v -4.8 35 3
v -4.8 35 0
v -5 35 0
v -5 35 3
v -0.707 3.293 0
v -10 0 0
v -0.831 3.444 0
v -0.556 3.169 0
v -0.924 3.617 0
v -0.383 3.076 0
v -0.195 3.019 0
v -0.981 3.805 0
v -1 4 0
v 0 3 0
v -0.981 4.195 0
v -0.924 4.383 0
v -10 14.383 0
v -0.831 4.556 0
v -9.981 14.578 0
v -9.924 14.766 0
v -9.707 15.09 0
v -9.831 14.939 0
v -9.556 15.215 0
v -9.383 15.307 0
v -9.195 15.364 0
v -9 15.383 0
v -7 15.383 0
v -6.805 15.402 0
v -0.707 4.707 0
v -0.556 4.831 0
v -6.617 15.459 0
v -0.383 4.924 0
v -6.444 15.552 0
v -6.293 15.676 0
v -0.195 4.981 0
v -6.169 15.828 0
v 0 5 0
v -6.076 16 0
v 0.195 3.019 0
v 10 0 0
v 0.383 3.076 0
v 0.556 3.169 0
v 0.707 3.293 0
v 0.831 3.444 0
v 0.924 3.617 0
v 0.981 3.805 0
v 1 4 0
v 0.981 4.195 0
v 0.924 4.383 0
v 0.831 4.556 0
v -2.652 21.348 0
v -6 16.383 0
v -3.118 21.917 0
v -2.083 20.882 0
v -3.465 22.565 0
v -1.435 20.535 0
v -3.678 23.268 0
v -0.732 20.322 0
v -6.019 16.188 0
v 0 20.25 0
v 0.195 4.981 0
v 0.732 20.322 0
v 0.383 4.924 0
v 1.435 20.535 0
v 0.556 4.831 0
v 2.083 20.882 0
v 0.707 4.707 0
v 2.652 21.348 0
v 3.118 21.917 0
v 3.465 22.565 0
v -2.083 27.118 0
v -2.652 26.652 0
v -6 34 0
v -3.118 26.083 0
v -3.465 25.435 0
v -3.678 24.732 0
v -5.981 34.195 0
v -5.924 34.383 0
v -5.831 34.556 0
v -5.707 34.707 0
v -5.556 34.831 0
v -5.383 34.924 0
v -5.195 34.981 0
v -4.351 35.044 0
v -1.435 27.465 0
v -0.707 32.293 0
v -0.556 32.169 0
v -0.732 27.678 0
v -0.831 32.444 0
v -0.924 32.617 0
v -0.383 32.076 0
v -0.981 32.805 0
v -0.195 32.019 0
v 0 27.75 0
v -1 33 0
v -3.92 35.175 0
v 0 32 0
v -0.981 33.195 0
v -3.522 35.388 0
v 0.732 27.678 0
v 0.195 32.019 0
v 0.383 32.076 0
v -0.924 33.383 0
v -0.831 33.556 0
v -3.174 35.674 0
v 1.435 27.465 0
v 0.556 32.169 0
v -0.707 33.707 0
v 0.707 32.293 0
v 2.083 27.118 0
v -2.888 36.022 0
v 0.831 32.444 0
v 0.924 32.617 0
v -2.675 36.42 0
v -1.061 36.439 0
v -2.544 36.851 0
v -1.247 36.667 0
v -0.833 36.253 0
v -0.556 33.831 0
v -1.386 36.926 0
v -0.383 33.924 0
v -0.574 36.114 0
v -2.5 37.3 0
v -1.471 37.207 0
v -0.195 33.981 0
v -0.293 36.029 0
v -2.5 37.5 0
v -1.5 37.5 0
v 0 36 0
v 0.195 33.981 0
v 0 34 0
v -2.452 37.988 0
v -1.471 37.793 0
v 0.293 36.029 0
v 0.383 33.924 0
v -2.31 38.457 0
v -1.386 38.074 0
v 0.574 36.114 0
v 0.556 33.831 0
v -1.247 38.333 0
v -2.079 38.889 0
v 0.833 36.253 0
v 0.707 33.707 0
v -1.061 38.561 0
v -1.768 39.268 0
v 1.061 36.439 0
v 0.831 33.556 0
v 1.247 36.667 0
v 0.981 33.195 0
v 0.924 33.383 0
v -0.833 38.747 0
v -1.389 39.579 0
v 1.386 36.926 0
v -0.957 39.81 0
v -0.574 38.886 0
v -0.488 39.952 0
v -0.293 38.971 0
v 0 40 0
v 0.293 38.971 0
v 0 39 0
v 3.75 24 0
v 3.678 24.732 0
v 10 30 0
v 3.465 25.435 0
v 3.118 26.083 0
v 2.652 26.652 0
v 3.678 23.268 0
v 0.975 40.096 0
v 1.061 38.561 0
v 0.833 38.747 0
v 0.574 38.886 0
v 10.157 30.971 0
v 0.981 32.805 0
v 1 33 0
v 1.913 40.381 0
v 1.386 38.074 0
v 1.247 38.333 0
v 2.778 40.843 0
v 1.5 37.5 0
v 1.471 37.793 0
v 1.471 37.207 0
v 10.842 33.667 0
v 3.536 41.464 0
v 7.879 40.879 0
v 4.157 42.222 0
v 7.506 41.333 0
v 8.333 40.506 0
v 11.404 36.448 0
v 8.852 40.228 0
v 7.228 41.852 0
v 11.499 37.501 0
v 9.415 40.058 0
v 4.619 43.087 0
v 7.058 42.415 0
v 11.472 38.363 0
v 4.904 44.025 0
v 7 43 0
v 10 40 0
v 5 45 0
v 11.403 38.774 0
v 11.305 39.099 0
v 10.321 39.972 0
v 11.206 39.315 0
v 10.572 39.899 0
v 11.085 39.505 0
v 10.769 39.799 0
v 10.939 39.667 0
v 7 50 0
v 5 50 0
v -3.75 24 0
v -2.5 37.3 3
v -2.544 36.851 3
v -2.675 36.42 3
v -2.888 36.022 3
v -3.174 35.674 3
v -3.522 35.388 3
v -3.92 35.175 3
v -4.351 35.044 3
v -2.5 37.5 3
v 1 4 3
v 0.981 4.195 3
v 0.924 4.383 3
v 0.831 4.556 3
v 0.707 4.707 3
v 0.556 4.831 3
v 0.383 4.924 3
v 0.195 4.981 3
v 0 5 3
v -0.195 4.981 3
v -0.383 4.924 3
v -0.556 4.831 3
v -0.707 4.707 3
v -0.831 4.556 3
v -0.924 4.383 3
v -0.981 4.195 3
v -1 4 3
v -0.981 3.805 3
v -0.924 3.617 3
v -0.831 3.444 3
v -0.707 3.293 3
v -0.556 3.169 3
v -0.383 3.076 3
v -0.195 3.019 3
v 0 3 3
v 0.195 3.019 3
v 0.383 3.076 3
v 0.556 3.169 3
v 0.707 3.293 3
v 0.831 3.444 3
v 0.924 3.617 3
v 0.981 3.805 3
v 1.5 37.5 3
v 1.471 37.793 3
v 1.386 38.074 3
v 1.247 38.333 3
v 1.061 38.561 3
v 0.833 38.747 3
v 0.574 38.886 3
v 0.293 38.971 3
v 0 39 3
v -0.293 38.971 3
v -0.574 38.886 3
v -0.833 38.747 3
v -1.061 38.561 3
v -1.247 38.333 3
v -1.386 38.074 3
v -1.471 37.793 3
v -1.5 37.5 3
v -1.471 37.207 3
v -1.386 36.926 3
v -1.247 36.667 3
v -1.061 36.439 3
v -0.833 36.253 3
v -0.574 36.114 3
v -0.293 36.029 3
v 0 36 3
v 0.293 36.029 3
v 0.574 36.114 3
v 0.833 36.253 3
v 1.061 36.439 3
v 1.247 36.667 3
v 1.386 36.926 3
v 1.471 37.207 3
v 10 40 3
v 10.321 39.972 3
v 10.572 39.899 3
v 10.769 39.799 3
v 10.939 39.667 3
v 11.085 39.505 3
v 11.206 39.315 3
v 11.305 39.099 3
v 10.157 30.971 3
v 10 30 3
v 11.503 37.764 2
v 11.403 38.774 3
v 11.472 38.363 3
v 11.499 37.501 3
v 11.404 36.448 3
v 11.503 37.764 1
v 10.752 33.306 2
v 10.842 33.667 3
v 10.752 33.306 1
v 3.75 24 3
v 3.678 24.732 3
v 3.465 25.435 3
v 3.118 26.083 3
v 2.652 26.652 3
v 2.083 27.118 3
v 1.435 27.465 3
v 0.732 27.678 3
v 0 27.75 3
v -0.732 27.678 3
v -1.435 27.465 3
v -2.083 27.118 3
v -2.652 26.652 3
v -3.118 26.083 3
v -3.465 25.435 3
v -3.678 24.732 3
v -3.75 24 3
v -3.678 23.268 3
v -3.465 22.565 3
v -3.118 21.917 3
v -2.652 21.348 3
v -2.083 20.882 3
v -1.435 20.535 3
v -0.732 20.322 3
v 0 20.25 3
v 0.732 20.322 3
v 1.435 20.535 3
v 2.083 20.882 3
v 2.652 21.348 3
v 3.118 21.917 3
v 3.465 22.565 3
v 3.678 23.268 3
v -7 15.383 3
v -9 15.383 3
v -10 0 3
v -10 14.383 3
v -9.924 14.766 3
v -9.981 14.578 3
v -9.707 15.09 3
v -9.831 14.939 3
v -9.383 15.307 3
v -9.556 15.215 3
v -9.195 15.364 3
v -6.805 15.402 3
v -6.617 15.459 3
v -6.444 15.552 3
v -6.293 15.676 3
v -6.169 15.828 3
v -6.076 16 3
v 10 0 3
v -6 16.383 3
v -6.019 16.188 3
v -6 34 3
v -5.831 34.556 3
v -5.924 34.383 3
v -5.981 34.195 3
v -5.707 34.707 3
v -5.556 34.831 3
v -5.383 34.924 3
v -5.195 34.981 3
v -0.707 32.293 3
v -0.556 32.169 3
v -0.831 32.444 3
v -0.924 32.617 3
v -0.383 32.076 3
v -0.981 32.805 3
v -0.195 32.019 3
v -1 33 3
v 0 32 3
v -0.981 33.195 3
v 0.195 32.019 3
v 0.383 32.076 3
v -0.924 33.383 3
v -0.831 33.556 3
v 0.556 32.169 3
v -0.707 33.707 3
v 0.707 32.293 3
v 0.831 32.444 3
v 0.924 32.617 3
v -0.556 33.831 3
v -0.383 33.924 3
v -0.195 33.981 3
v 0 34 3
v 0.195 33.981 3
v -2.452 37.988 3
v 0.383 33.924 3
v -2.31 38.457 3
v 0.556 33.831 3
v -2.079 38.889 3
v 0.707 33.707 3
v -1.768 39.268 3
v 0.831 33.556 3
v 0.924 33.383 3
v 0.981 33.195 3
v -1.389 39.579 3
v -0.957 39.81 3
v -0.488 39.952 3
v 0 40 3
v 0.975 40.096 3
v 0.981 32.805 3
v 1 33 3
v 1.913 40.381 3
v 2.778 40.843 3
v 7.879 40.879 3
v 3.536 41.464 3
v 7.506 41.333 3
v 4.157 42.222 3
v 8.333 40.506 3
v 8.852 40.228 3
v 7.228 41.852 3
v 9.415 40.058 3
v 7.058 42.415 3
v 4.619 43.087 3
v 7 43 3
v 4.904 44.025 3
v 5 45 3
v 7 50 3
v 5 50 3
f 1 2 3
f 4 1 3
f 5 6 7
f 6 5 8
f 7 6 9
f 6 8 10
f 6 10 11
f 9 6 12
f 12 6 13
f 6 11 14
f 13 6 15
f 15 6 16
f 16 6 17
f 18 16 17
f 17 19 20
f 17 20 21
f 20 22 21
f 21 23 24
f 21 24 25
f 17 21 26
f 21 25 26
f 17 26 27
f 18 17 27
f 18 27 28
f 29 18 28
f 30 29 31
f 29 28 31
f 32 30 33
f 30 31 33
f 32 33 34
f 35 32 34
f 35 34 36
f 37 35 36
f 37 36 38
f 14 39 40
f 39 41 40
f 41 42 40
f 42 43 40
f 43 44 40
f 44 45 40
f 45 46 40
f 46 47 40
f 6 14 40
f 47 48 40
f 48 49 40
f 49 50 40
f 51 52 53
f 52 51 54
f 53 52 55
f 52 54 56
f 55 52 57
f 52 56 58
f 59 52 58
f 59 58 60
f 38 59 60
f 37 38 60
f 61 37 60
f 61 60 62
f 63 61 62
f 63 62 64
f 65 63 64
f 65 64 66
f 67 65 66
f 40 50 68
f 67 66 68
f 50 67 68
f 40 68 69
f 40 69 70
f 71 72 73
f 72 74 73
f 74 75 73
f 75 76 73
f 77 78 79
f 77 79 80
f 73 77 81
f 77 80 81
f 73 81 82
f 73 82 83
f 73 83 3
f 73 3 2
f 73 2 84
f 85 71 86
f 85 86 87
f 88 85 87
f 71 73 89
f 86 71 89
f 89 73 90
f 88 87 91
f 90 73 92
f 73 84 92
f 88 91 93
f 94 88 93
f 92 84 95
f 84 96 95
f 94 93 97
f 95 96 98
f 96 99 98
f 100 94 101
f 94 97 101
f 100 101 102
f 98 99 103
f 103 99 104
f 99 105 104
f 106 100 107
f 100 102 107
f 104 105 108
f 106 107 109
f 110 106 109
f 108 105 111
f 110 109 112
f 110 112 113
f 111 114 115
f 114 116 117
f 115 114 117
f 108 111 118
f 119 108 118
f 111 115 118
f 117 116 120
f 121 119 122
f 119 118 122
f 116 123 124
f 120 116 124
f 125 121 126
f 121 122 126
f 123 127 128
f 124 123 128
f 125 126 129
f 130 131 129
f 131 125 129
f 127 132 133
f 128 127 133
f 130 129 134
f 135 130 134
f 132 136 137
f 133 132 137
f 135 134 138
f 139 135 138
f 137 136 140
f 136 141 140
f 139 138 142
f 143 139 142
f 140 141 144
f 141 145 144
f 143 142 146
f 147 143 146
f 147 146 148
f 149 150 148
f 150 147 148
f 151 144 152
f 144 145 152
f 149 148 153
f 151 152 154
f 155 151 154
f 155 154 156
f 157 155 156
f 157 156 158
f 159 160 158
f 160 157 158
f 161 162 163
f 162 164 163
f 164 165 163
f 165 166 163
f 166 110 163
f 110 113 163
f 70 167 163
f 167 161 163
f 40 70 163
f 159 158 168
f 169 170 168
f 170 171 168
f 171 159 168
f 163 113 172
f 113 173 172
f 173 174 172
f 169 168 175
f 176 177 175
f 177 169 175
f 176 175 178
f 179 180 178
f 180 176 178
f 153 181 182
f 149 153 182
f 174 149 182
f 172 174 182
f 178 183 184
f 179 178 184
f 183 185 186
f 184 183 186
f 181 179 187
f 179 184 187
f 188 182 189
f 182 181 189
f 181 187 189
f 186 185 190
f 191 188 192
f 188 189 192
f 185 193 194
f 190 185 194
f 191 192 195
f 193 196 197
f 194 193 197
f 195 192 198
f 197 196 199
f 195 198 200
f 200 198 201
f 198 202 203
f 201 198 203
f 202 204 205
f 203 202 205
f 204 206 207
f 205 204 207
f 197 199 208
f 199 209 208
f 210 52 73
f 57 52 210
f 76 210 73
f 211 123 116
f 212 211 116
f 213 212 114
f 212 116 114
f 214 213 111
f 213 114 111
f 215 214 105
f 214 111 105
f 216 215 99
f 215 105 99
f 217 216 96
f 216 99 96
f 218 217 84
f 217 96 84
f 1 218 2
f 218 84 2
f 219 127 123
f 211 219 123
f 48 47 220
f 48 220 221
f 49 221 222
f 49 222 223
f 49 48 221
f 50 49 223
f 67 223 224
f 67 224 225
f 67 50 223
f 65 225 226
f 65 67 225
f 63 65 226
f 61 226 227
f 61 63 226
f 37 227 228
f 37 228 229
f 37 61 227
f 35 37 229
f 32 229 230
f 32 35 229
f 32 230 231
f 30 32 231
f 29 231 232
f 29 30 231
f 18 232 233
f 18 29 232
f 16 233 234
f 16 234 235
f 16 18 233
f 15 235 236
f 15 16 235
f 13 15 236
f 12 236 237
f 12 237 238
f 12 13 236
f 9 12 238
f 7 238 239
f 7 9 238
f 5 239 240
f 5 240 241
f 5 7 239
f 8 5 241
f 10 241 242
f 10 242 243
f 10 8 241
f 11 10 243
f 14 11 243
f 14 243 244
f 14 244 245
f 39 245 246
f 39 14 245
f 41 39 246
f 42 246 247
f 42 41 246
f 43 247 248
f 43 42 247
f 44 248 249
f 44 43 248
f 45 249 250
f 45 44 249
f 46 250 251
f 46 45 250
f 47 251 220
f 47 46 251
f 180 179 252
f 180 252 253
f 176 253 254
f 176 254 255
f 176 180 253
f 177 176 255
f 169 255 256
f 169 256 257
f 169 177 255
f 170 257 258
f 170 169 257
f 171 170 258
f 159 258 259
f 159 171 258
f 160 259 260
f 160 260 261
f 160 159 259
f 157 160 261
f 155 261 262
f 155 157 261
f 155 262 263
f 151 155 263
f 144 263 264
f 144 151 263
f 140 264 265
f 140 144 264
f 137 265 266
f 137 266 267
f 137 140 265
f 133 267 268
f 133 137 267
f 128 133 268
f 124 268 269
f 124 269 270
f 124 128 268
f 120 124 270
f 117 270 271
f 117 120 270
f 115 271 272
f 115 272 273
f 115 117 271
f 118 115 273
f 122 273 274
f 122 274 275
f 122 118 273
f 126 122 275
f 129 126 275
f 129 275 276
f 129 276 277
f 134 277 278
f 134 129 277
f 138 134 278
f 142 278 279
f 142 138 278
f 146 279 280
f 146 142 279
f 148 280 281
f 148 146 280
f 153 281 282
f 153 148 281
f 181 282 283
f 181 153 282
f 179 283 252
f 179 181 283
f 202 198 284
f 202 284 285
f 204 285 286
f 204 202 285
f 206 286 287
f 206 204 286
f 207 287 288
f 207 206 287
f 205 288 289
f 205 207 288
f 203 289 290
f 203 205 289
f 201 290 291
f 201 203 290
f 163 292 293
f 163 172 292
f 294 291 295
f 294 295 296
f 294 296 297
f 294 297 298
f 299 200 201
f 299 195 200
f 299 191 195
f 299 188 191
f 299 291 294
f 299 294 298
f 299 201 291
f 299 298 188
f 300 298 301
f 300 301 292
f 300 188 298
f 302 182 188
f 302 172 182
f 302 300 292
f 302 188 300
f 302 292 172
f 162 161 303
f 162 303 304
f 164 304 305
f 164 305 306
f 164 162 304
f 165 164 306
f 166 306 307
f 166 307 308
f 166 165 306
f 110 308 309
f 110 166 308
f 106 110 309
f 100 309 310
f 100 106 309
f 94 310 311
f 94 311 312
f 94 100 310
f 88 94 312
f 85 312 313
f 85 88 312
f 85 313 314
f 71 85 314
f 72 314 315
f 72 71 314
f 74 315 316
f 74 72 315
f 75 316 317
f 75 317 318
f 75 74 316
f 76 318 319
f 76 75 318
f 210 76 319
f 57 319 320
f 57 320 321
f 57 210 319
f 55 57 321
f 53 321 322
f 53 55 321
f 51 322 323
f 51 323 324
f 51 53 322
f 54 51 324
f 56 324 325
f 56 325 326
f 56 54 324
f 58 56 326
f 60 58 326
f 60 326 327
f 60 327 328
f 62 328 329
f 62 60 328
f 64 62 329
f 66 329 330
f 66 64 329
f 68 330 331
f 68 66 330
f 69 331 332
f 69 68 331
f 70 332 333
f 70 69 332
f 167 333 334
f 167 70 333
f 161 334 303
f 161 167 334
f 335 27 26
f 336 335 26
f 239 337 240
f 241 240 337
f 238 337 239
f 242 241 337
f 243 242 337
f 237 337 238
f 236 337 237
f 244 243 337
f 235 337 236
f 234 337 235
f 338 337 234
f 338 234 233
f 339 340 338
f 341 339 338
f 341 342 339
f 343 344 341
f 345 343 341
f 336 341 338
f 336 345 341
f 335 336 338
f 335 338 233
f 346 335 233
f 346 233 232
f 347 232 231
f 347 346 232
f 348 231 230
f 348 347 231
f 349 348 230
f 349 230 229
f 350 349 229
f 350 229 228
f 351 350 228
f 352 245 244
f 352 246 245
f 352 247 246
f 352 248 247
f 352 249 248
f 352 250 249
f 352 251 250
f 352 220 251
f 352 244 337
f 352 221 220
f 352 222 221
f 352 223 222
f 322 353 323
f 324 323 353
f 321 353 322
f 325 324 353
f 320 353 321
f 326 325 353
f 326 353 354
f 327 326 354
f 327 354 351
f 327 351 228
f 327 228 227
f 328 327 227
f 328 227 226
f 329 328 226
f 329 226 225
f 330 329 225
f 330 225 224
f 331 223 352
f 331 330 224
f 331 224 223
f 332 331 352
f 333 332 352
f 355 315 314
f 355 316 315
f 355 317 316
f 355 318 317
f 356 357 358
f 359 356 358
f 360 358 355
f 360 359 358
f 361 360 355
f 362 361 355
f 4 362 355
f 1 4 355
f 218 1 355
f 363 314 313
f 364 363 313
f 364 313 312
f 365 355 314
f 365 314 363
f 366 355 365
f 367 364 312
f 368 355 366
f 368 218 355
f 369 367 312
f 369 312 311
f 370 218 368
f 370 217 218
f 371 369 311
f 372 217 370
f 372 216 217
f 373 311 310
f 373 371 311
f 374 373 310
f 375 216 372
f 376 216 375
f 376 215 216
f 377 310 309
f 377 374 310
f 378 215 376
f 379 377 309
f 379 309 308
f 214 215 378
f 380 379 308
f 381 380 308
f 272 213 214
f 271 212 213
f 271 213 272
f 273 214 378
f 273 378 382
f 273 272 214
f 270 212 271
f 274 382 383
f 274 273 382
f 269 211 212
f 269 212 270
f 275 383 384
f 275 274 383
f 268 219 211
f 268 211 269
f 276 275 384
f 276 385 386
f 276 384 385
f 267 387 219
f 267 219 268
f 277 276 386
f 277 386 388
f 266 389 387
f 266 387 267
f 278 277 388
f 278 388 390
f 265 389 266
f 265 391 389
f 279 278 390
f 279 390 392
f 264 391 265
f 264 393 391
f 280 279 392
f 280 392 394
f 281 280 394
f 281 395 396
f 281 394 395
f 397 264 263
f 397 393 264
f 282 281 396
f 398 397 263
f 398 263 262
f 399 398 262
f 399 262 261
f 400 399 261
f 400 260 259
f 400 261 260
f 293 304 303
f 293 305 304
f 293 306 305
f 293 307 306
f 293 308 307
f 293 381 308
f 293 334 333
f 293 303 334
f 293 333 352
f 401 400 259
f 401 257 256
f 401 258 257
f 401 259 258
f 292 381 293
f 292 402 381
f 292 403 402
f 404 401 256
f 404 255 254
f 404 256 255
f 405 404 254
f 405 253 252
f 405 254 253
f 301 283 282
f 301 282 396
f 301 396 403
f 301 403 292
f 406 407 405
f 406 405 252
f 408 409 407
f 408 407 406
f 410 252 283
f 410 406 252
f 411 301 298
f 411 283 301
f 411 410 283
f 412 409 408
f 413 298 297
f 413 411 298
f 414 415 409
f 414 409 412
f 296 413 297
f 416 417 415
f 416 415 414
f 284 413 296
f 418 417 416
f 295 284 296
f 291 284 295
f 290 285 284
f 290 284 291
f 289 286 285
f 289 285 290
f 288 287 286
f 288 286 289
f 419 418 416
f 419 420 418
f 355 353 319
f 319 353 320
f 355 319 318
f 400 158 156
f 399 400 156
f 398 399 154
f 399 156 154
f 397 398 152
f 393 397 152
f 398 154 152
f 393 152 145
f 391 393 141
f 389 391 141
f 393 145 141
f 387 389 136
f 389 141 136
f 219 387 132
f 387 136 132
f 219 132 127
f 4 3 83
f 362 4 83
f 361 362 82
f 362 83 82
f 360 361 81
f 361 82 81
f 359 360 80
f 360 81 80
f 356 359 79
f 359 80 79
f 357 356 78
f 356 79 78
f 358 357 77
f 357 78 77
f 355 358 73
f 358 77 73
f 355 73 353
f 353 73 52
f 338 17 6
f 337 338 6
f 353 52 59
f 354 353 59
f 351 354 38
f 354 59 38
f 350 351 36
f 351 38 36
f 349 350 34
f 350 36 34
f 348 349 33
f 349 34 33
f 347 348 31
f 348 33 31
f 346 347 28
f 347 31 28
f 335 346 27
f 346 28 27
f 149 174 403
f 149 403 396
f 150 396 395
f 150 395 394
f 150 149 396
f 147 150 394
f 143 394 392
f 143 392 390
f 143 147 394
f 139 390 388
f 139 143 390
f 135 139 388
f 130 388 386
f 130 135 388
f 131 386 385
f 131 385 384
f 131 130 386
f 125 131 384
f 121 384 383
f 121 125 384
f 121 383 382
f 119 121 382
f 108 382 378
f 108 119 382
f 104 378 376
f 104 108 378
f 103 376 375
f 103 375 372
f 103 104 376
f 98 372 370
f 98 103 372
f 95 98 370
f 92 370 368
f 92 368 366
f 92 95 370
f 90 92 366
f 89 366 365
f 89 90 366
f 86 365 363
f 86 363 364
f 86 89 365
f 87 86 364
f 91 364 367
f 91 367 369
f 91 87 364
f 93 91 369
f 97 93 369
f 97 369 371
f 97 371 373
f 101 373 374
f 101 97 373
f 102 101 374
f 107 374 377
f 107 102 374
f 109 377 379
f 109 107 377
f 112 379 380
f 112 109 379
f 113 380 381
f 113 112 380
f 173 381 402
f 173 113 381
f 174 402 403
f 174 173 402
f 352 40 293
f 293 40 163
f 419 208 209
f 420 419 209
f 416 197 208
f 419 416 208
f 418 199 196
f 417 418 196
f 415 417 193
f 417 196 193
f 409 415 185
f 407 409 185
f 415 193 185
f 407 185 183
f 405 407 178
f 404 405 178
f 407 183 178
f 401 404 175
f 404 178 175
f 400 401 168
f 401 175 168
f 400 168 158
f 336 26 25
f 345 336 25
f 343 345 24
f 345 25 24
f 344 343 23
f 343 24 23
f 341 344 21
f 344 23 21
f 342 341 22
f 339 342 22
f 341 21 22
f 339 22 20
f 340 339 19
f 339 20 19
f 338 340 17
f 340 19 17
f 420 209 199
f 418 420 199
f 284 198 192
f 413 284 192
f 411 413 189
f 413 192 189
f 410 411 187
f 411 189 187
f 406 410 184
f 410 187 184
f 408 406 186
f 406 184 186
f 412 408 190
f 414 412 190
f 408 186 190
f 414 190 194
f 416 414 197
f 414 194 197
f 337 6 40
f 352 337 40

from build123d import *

# Parameters (mm, degrees)
CROQUIS2_R              = 1.5
CROQUIS2_R_2            = 1
CROQUIS2_R_3            = 3.75
SALIENTE_EXTRUIR1_DEPTH = 3


with BuildPart() as part:
    # Croquis2 → Saliente-Extruir1 (new body)
    with BuildSketch(Plane.XY):
        with BuildLine():
            Line((10, 0), (10, 30))
            add(Edge.make_bspline(
                [(10, 40), (13.382456464, 40), (10, 31.604422757), (10, 30)],
                knots=[0, 0, 0, 0, 1, 1, 1, 1], degree=3))
            ThreePointArc((10, 40), (7.878679656, 40.878679656), (7, 43))
            Line((7, 43), (7, 50))
            Line((7, 50), (5, 50))
            Line((5, 50), (5, 45))
            ThreePointArc((5, 45), (3.535533906, 41.464466094), (0, 40))
            ThreePointArc((0, 40), (-1.767766953, 39.267766953), (-2.5, 37.5))
            Line((-2.5, 37.5), (-2.5, 37.3))
            ThreePointArc((-2.5, 37.3), (-3.173654403, 35.673654403), (-4.8, 35))
            Line((-4.8, 35), (-5, 35))
            ThreePointArc((-5, 35), (-5.707106781, 34.707106781), (-6, 34))
            Line((-6, 34), (-6, 30))
            Line((-6, 30), (-6, 16.38315603))
            ThreePointArc((-6, 16.38315603), (-6.292893219, 15.676049249), (-7, 15.38315603))
            Line((-7, 15.38315603), (-9, 15.38315603))
            ThreePointArc((-9, 15.38315603), (-9.707106781, 15.090262811), (-10, 14.38315603))
            Line((-10, 14.38315603), (-10, 0))
            Line((-10, 0), (10, 0))
        make_face()
        with Locations((0, 37.5)):
            Circle(CROQUIS2_R, mode=Mode.SUBTRACT)
        with Locations((0, 33)):
            Circle(CROQUIS2_R_2, mode=Mode.SUBTRACT)
        with Locations((0, 4)):
            Circle(CROQUIS2_R_2, mode=Mode.SUBTRACT)
        with Locations((0, 24)):
            Circle(CROQUIS2_R_3, mode=Mode.SUBTRACT)
    extrude(amount=SALIENTE_EXTRUIR1_DEPTH)


solid = part.part
